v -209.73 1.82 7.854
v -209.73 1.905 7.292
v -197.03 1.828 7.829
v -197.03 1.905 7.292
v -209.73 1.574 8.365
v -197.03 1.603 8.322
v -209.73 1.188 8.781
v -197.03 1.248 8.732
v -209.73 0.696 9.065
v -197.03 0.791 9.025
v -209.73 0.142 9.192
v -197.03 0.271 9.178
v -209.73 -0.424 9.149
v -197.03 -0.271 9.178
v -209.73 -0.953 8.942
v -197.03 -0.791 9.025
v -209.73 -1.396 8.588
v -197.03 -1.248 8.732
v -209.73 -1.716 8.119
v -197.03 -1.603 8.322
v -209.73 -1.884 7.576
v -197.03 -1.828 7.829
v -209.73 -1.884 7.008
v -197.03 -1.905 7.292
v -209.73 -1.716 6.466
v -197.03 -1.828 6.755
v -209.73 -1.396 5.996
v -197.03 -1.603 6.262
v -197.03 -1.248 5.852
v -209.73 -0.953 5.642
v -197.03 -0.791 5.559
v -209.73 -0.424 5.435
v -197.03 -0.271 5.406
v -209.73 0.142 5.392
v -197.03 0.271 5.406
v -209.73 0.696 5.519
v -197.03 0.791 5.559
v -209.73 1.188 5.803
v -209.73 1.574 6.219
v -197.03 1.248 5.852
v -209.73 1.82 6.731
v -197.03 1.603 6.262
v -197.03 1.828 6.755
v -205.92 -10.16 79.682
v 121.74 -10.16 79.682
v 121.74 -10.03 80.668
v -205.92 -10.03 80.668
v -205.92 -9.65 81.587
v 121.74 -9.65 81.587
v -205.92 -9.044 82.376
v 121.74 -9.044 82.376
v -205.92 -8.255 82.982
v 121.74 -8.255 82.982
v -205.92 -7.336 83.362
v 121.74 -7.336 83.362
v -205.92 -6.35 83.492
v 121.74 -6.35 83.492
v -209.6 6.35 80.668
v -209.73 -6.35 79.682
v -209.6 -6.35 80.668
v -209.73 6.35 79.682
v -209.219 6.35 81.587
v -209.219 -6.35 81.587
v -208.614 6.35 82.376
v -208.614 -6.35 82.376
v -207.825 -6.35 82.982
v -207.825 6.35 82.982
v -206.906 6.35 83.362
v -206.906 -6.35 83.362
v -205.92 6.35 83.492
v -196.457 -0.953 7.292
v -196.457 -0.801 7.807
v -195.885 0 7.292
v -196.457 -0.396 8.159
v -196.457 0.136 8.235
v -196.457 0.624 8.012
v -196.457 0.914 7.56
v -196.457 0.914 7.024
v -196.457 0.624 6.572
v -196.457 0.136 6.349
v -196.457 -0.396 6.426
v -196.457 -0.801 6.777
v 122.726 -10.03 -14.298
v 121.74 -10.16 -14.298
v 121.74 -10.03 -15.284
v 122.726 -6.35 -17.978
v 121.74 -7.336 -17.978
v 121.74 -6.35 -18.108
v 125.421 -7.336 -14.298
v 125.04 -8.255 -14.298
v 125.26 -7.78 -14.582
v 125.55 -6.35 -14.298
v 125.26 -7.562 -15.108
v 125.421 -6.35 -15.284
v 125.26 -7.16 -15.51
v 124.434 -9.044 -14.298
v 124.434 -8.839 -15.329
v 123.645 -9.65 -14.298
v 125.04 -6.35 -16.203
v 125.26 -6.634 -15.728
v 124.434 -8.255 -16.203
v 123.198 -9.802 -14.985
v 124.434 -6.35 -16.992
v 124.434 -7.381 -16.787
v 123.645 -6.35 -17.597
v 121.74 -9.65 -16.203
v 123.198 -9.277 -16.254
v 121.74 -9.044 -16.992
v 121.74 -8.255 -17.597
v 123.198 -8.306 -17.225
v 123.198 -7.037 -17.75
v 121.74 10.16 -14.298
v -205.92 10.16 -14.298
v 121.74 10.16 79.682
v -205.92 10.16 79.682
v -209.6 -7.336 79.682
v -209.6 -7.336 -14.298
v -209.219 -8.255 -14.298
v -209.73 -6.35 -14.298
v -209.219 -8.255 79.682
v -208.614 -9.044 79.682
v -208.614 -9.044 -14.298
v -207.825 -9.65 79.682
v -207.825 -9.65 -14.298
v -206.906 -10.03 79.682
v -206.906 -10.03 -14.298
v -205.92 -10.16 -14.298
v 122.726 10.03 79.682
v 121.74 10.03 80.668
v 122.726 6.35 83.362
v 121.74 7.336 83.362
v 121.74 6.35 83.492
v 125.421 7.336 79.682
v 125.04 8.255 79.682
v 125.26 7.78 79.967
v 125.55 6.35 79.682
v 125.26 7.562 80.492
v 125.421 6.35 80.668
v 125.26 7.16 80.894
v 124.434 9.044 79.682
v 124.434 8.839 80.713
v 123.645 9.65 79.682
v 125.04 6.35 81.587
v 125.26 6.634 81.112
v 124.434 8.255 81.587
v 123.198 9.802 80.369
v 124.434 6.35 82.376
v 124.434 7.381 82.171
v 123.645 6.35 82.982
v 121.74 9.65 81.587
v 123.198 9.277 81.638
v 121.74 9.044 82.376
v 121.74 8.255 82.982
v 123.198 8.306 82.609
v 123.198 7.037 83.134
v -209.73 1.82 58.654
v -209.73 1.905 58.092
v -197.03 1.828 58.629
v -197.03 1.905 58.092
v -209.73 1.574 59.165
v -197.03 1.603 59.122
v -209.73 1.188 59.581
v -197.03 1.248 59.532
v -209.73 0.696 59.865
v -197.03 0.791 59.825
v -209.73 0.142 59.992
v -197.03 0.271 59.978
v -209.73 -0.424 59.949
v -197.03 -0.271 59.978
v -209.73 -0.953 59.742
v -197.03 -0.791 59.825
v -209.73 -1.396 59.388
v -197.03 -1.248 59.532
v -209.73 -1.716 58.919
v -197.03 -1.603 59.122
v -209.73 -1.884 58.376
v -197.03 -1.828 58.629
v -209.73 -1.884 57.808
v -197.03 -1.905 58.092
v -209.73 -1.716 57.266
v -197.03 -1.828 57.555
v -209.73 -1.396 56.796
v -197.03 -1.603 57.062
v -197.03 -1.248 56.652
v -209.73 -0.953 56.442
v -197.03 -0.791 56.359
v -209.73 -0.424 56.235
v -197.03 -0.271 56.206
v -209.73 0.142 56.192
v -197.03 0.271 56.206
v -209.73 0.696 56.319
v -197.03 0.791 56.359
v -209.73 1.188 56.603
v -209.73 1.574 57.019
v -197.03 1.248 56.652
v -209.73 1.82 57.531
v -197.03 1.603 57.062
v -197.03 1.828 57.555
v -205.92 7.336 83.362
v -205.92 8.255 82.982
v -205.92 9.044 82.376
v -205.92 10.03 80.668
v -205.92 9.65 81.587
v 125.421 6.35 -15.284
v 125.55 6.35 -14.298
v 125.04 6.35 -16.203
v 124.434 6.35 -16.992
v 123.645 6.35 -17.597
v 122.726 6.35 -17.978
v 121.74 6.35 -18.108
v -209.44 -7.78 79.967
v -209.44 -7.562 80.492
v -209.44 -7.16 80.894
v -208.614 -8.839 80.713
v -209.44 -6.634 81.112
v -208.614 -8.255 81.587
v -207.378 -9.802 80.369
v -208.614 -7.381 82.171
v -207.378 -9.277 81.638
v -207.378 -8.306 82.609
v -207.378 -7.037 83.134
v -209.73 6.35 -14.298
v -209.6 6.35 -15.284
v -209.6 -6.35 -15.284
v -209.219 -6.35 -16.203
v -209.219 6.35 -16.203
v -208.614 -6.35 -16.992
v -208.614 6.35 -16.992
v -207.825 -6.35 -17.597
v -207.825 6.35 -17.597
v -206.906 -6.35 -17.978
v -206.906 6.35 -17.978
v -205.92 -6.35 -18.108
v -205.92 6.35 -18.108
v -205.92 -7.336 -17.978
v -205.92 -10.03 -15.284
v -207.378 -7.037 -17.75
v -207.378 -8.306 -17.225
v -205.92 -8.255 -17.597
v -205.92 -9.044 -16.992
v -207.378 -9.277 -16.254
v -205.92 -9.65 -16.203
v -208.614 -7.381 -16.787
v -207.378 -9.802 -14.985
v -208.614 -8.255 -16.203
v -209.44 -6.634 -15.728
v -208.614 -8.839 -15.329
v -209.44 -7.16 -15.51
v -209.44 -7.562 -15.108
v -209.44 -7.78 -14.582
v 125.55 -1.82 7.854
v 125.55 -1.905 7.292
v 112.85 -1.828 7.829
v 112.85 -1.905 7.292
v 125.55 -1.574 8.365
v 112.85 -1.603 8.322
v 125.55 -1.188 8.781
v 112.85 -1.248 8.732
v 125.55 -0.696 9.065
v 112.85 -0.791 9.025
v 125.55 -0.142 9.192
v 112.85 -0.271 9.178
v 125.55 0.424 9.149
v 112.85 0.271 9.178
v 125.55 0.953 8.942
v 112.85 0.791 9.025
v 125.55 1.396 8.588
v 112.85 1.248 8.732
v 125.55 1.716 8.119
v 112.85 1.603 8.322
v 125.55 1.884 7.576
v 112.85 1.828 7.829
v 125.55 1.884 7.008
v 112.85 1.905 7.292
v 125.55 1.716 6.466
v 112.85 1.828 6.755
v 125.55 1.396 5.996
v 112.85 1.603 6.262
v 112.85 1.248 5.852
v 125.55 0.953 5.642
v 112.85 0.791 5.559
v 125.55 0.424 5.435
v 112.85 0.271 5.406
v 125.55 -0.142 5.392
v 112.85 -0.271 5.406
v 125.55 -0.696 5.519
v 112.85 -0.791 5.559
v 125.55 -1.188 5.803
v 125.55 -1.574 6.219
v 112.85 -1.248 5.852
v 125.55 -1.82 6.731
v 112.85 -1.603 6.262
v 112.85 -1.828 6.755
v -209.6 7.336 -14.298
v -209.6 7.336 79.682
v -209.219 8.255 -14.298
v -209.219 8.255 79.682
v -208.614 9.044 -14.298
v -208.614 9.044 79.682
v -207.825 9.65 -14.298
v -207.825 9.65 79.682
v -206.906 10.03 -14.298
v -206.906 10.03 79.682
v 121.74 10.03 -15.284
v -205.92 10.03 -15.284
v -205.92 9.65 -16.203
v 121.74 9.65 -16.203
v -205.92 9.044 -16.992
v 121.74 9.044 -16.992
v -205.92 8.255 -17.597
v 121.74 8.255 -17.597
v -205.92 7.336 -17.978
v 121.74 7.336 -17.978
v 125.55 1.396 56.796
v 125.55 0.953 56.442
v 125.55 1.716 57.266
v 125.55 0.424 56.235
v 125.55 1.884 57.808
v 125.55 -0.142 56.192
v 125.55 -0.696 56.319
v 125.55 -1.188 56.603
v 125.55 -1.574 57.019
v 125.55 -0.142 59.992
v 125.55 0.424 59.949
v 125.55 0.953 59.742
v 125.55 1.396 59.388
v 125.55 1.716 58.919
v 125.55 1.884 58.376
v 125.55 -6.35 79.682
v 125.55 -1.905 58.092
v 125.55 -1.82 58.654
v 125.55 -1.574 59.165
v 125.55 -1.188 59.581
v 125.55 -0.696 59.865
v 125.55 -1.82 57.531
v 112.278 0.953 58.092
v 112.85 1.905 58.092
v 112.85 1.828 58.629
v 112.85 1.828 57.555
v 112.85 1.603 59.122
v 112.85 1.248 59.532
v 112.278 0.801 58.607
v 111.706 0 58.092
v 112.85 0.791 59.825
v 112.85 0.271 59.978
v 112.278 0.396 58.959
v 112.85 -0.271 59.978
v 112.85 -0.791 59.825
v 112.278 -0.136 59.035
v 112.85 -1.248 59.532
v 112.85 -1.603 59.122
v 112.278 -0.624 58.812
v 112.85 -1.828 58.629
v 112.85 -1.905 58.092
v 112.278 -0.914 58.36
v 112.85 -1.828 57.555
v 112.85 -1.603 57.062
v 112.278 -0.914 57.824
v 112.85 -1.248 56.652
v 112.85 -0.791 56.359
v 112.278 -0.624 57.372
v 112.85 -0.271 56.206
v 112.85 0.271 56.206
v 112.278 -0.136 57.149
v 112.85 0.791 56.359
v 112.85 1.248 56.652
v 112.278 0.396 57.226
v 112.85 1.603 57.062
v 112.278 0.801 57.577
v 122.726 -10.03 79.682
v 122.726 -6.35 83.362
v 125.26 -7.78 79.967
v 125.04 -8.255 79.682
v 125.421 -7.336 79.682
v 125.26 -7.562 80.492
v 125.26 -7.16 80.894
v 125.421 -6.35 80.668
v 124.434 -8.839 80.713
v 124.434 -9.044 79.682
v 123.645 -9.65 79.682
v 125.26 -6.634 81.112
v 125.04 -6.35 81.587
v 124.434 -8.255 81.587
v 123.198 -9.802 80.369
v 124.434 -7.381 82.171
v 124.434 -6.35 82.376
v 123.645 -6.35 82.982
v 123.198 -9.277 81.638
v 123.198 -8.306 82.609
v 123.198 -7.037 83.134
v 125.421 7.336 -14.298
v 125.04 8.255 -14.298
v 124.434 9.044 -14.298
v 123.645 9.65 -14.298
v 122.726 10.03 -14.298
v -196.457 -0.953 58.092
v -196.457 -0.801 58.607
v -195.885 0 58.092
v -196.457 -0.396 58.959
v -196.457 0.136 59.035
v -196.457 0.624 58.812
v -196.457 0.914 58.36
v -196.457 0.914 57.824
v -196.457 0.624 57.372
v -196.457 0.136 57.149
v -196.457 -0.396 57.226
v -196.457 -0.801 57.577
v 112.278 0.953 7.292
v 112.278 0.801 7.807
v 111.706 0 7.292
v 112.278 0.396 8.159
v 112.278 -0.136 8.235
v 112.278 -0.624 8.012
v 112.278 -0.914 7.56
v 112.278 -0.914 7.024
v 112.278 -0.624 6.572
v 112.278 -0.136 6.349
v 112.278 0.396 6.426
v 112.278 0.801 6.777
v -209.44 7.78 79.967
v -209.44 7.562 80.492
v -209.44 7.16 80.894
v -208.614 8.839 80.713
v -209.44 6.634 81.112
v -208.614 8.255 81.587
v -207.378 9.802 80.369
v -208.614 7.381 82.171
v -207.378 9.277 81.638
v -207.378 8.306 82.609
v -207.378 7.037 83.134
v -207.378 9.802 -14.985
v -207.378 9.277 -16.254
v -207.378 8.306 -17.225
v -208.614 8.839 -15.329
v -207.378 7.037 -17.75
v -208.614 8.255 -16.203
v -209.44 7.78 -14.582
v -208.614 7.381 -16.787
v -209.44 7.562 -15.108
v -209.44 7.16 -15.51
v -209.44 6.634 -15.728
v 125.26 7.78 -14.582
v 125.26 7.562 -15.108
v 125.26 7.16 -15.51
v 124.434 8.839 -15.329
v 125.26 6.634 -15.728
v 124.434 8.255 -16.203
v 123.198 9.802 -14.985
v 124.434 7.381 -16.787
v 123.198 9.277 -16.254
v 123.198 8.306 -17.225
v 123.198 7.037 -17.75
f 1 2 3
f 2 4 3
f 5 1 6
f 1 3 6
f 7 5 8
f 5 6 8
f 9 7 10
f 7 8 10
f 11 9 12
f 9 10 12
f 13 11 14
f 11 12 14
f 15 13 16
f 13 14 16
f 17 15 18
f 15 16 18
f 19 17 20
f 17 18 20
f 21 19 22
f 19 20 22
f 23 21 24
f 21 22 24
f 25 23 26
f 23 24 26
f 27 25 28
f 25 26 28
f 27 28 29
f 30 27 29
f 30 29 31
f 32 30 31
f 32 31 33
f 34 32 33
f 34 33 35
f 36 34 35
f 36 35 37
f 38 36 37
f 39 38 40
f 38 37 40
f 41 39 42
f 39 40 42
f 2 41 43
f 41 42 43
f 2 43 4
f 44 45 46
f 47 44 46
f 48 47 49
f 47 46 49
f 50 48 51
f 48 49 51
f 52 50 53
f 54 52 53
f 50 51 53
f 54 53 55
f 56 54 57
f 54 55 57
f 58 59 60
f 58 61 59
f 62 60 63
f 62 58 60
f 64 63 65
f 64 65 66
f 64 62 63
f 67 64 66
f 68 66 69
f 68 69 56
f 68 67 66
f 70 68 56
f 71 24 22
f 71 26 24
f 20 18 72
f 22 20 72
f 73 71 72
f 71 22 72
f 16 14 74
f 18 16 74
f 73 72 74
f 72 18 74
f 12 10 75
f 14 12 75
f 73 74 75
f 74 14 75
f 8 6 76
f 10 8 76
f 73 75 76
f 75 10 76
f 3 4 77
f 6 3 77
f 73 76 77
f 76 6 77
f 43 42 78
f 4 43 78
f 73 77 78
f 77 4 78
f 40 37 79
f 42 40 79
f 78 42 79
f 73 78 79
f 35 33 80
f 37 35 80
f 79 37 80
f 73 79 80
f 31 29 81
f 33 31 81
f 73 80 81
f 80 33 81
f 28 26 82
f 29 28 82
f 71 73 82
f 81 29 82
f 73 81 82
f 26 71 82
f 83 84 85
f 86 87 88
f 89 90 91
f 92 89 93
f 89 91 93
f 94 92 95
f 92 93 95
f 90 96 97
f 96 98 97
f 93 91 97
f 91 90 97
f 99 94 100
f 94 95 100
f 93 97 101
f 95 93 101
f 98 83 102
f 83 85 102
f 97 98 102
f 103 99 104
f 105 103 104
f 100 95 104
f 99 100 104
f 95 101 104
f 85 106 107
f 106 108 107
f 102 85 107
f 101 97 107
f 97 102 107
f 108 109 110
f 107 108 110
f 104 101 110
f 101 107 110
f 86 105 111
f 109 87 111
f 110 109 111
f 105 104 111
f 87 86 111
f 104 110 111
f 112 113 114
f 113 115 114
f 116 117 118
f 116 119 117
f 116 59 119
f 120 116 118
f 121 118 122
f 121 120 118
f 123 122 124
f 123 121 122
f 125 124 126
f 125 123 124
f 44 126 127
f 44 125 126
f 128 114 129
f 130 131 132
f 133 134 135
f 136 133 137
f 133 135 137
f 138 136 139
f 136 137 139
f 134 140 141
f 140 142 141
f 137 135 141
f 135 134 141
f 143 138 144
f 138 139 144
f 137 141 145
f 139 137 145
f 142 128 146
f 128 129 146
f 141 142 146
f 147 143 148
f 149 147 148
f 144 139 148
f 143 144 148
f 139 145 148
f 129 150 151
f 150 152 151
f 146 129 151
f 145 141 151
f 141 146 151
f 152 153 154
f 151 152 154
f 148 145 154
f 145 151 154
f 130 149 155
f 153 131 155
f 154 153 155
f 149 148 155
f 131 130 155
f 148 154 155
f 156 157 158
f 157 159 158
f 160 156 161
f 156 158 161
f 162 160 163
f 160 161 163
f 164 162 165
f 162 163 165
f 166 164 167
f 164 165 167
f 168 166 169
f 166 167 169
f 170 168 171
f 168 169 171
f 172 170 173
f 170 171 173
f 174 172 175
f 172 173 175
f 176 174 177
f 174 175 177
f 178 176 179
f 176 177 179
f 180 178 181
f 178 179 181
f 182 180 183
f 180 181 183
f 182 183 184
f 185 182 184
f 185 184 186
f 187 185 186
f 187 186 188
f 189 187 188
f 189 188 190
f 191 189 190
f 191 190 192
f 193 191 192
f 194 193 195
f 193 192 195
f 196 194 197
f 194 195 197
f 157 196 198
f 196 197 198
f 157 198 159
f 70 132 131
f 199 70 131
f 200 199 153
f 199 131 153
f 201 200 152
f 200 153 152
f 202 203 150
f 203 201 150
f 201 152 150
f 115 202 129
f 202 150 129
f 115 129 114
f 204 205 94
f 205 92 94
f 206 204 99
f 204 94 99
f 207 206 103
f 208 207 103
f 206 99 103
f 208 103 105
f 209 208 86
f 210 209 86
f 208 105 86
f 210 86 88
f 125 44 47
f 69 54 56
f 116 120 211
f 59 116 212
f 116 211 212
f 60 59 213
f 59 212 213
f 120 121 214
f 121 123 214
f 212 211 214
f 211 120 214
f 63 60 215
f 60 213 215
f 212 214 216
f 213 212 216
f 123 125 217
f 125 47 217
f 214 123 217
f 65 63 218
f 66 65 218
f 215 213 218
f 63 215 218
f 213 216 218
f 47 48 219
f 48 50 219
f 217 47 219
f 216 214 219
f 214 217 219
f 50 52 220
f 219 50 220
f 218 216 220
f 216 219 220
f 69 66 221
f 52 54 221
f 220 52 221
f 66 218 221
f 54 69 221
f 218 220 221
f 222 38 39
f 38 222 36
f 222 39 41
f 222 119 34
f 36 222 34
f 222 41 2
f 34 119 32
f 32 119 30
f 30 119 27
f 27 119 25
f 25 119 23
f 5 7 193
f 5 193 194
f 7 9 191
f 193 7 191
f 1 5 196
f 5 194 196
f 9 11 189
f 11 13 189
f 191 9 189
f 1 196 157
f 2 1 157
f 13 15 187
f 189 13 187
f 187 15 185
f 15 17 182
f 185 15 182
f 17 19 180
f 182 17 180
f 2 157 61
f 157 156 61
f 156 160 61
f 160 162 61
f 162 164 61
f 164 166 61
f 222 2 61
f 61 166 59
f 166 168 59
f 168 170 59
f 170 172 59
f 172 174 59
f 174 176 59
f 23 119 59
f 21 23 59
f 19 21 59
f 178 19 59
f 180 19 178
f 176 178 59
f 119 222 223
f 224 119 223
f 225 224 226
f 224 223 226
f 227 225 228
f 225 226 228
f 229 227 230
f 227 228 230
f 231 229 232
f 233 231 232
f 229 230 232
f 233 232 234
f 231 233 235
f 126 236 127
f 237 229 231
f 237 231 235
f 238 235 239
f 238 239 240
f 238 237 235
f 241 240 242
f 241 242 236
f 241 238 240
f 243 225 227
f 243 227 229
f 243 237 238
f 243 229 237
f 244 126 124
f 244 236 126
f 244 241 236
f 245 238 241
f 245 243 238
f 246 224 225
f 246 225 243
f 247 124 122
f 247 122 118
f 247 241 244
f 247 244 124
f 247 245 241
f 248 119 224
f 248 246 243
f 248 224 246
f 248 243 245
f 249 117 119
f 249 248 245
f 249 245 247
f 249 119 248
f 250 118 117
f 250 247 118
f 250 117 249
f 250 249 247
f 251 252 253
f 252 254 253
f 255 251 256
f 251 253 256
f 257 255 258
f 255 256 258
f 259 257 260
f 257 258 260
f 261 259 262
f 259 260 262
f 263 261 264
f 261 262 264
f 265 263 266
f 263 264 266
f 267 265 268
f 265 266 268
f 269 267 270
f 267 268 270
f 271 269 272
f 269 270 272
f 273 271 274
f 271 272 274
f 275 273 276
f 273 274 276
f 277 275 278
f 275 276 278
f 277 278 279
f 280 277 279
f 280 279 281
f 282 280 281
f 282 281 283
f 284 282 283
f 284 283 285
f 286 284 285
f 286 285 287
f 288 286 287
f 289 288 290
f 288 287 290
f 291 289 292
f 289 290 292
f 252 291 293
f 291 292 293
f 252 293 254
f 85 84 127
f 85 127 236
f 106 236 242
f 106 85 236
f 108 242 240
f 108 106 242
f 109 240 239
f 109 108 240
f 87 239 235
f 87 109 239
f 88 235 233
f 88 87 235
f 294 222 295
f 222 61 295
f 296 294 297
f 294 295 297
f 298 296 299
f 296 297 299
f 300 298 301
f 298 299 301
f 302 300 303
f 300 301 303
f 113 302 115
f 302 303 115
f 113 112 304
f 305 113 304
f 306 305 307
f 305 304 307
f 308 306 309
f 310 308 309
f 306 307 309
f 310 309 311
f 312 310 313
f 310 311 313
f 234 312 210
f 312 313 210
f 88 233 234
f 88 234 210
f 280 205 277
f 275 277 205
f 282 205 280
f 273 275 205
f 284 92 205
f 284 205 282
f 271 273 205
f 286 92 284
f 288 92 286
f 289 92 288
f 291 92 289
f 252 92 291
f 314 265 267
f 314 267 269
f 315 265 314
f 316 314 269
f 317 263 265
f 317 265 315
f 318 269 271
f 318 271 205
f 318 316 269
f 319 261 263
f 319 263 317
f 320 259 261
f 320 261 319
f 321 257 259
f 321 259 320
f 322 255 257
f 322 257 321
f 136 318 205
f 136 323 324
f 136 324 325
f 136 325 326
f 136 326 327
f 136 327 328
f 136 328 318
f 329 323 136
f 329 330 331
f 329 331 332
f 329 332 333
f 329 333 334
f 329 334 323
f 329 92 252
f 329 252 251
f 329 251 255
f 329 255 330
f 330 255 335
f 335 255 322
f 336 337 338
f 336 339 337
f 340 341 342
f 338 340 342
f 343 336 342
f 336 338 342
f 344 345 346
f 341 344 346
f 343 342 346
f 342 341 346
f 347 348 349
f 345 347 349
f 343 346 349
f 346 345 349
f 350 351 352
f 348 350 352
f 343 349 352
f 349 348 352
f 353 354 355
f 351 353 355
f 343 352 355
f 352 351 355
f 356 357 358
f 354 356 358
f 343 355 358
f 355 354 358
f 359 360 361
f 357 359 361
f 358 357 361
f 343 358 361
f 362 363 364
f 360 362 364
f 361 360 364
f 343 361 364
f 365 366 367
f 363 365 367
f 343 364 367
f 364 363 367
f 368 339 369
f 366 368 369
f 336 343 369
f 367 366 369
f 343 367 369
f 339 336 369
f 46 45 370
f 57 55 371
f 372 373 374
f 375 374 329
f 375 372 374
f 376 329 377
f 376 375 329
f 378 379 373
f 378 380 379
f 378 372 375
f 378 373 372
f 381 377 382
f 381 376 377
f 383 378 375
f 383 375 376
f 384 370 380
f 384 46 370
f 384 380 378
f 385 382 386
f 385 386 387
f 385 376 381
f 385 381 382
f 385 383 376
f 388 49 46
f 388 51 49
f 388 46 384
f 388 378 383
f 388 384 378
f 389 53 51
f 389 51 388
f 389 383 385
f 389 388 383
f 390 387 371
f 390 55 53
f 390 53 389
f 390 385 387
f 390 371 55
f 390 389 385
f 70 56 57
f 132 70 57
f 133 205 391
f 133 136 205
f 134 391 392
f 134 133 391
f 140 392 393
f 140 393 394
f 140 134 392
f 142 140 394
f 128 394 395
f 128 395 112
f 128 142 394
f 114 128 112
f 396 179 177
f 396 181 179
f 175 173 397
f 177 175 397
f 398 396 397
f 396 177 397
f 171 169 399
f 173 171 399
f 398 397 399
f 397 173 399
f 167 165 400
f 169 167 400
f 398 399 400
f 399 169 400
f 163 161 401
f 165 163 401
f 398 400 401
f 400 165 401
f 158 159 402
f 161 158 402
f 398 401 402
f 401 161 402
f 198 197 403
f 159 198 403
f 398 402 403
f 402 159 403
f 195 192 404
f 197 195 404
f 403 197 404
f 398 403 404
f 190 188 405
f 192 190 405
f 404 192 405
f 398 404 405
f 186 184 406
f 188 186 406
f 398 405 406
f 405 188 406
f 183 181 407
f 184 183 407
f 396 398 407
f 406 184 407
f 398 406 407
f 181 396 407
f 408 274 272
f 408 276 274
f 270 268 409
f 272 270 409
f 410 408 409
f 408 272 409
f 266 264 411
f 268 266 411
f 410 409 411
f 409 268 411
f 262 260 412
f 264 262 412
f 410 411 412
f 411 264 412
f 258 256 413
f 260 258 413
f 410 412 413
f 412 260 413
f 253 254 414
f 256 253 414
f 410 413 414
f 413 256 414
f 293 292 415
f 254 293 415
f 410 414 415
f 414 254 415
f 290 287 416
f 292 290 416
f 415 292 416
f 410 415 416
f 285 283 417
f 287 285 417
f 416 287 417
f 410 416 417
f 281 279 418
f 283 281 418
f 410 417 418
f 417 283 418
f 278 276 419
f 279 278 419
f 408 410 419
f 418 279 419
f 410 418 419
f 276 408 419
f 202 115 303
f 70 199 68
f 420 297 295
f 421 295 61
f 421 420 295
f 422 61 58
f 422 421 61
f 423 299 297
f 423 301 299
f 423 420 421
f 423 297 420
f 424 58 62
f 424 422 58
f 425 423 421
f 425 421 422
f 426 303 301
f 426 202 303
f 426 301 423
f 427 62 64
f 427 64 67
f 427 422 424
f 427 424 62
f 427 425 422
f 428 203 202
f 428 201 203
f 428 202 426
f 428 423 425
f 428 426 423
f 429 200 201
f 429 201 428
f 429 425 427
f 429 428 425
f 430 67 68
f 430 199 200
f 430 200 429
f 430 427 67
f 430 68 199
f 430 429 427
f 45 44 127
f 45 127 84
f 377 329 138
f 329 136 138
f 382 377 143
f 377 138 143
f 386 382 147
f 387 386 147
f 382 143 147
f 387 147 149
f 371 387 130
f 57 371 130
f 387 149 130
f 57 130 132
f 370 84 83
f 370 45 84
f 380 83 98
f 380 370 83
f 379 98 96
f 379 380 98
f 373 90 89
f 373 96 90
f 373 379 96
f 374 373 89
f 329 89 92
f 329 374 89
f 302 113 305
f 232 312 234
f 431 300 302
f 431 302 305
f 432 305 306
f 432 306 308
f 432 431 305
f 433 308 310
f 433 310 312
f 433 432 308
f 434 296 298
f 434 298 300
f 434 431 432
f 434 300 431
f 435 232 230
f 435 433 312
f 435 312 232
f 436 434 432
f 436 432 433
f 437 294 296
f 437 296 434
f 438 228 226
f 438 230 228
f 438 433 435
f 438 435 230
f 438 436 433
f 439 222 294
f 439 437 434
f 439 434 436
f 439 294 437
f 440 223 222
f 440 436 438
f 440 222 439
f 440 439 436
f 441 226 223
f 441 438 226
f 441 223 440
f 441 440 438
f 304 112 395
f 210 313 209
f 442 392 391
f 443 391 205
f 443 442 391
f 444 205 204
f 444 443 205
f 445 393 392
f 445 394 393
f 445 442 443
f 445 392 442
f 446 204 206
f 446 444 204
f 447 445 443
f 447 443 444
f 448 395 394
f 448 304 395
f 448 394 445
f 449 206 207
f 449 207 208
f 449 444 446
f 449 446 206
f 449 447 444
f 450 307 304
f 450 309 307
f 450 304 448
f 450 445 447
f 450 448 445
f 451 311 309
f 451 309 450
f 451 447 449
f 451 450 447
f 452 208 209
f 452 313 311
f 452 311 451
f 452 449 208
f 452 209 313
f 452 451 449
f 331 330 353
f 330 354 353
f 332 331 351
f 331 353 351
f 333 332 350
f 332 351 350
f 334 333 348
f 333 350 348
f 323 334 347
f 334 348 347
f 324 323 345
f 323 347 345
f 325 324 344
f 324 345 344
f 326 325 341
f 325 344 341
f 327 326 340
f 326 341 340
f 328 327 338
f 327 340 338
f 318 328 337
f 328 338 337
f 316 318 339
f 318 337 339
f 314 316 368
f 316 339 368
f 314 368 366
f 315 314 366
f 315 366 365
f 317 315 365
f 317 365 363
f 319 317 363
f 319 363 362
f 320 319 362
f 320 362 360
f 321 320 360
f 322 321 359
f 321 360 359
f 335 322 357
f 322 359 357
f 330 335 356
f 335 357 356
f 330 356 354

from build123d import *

# Parameters (mm, degrees)
F0_W         = 335.28
F0_H         = 101.6
F1_DEPTH     = 10.16
F2_R         = 3.81
F4_D         = 3.81
F4_DEPTH     = 12.7
F4_TIP       = 1.1446394792
F5_D         = 3.81
F5_DEPTH     = 12.7
F5_TIP       = 1.1446394792
F6_T1_DEPTH  = 12.7
F6_S5_W      = 3.81
F6_S5_H      = 3.81
F6_T6_DEPTH  = 3.81
F6_S11_W     = 3.81
F6_S11_H     = 3.81
F6_T12_DEPTH = 3.81
F8_D         = 3.81
F8_DEPTH     = 12.7
F8_TIP       = 1.1446394792
F9_D         = 3.81
F9_DEPTH     = 12.7
F9_TIP       = 1.1446394792


# Not quite as in the source:
# - a fillet or chamfer that OpenCascade refuses, or shapes differently, is made with other operations: its cross-section is extruded or revolved along the edge and cut away or added


with BuildPart() as f1:
    # F0 (on Front) → F1 (new body, symmetric)
    with BuildSketch(Plane.XZ):
        with Locations((-42.0896737862, 32.6920958787)):
            Rectangle(F0_W, F0_H)
    extrude(amount=F1_DEPTH, both=True)

    # F2
    f2_edges = [f1.edges().sort_by_distance(p)[0] for p in [
        (-42.089674, -10.16, 83.492096),
        (-209.729674, -10.16, 32.692096),
        (-42.089674, -10.16, -18.107904),
        (125.550326, -10.16, 32.692096),
        (-42.089674, 10.16, -18.107904),
        (-42.089674, 10.16, 83.492096),
        (-209.729674, 10.16, 32.692096),
        (125.550326, 10.16, 32.692096),
        (125.550326, 0, 83.492096),
        (125.550326, 0, -18.107904),
        (-209.729674, 0, 83.492096),
    ]]
    fillet(f2_edges, radius=F2_R)

    # F4
    with Locations(Plane.YZ.offset(125.5503262138)):
        with Locations((0, 58.0920958787)):
            Hole(F4_D / 2, depth=F4_DEPTH)
            with Locations((0, 0, -(F4_DEPTH + F4_TIP / 2))):  # 118° drill point
                Cone(0, F4_D / 2, F4_TIP, mode=Mode.SUBTRACT)

    # F5
    with Locations(Plane.YZ.offset(125.5503262138)):
        with Locations((0, 7.2920958787)):
            Hole(F5_D / 2, depth=F5_DEPTH)
            with Locations((0, 0, -(F5_DEPTH + F5_TIP / 2))):  # 118° drill point
                Cone(0, F5_D / 2, F5_TIP, mode=Mode.SUBTRACT)

    # F6: fillet of radius 3.81 on 1 edges, made by hand

    # F6_s2 → F6_t1 (cut)
    with BuildSketch(Plane.XZ.offset(-6.35)):
        with BuildLine():
            ThreePointArc((-209.7296737862, -14.2979041213), (-208.6137506225, -16.9919809576), (-205.9196737862, -18.1079041213))
            Line((-205.9196737862, -18.1079041213), (-209.7296737862, -18.1079041213))
            Line((-209.7296737862, -18.1079041213), (-209.7296737862, -14.2979041213))
        make_face()
    extrude(amount=F6_T1_DEPTH, mode=Mode.SUBTRACT)


with BuildPart() as f6_tool4:
    # F6_s5 → F6_t6 (new body)
    with BuildSketch(Plane.YZ.offset(-205.9196737862)):
        with Locations((8.255, -16.2029041213)):
            Rectangle(F6_S5_W, F6_S5_H)
    extrude(amount=-F6_T6_DEPTH)

    # F6_s7 → F6_t8 (revolve, cut)
    with BuildSketch(Plane(origin=(-205.9196737862, 6.35, -14.2979041213), x_dir=(0, -0.7071067812, 0.7071067812), z_dir=(0, -0.7071067812, -0.7071067812))):
        with BuildLine():
            ThreePointArc((0, -3.81), (3.81, 0), (0, 3.81))
            Line((0, 3.81), (0, -3.81))
        make_face()
    revolve(axis=Axis((-205.9196737862, 6.35, -14.2979041213), (-1, 0, 0)), mode=Mode.SUBTRACT)


with BuildPart() as f1_1:
    add(f1.part)

    # F6_t3: cut F6_tool4
    add(f6_tool4.part, mode=Mode.SUBTRACT)


with BuildPart() as f6_tool10:
    # F6_s11 → F6_t12 (new body)
    with BuildSketch(Plane.YZ.offset(-205.9196737862)):
        with Locations((-8.255, -16.2029041213)):
            Rectangle(F6_S11_W, F6_S11_H)
    extrude(amount=-F6_T12_DEPTH)

    # F6_s13 → F6_t14 (revolve, cut)
    with BuildSketch(Plane(origin=(-205.9196737862, -6.35, -14.2979041213), x_dir=(0, 0.7071067812, 0.7071067812), z_dir=(0, -0.7071067812, 0.7071067812))):
        with BuildLine():
            ThreePointArc((0, -3.81), (3.81, 0), (0, 3.81))
            Line((0, 3.81), (0, -3.81))
        make_face()
    revolve(axis=Axis((-205.9196737862, -6.35, -14.2979041213), (-1, 0, 0)), mode=Mode.SUBTRACT)


with BuildPart() as f1_2:
    add(f1_1.part)

    # F6_t9: cut F6_tool10
    add(f6_tool10.part, mode=Mode.SUBTRACT)

    # F8
    with Locations(Plane(origin=(-209.7296737862, 0, 0), x_dir=(0, -1, 0), z_dir=(-1, 0, 0))):
        with Locations((0, 58.0920958787)):
            Hole(F8_D / 2, depth=F8_DEPTH)
            with Locations((0, 0, -(F8_DEPTH + F8_TIP / 2))):  # 118° drill point
                Cone(0, F8_D / 2, F8_TIP, mode=Mode.SUBTRACT)

    # F9
    with Locations(Plane(origin=(-209.7296737862, 0, 0), x_dir=(0, -1, 0), z_dir=(-1, 0, 0))):
        with Locations((0, 7.2920958787)):
            Hole(F9_D / 2, depth=F9_DEPTH)
            with Locations((0, 0, -(F9_DEPTH + F9_TIP / 2))):  # 118° drill point
                Cone(0, F9_D / 2, F9_TIP, mode=Mode.SUBTRACT)


solid = f1_2.part
